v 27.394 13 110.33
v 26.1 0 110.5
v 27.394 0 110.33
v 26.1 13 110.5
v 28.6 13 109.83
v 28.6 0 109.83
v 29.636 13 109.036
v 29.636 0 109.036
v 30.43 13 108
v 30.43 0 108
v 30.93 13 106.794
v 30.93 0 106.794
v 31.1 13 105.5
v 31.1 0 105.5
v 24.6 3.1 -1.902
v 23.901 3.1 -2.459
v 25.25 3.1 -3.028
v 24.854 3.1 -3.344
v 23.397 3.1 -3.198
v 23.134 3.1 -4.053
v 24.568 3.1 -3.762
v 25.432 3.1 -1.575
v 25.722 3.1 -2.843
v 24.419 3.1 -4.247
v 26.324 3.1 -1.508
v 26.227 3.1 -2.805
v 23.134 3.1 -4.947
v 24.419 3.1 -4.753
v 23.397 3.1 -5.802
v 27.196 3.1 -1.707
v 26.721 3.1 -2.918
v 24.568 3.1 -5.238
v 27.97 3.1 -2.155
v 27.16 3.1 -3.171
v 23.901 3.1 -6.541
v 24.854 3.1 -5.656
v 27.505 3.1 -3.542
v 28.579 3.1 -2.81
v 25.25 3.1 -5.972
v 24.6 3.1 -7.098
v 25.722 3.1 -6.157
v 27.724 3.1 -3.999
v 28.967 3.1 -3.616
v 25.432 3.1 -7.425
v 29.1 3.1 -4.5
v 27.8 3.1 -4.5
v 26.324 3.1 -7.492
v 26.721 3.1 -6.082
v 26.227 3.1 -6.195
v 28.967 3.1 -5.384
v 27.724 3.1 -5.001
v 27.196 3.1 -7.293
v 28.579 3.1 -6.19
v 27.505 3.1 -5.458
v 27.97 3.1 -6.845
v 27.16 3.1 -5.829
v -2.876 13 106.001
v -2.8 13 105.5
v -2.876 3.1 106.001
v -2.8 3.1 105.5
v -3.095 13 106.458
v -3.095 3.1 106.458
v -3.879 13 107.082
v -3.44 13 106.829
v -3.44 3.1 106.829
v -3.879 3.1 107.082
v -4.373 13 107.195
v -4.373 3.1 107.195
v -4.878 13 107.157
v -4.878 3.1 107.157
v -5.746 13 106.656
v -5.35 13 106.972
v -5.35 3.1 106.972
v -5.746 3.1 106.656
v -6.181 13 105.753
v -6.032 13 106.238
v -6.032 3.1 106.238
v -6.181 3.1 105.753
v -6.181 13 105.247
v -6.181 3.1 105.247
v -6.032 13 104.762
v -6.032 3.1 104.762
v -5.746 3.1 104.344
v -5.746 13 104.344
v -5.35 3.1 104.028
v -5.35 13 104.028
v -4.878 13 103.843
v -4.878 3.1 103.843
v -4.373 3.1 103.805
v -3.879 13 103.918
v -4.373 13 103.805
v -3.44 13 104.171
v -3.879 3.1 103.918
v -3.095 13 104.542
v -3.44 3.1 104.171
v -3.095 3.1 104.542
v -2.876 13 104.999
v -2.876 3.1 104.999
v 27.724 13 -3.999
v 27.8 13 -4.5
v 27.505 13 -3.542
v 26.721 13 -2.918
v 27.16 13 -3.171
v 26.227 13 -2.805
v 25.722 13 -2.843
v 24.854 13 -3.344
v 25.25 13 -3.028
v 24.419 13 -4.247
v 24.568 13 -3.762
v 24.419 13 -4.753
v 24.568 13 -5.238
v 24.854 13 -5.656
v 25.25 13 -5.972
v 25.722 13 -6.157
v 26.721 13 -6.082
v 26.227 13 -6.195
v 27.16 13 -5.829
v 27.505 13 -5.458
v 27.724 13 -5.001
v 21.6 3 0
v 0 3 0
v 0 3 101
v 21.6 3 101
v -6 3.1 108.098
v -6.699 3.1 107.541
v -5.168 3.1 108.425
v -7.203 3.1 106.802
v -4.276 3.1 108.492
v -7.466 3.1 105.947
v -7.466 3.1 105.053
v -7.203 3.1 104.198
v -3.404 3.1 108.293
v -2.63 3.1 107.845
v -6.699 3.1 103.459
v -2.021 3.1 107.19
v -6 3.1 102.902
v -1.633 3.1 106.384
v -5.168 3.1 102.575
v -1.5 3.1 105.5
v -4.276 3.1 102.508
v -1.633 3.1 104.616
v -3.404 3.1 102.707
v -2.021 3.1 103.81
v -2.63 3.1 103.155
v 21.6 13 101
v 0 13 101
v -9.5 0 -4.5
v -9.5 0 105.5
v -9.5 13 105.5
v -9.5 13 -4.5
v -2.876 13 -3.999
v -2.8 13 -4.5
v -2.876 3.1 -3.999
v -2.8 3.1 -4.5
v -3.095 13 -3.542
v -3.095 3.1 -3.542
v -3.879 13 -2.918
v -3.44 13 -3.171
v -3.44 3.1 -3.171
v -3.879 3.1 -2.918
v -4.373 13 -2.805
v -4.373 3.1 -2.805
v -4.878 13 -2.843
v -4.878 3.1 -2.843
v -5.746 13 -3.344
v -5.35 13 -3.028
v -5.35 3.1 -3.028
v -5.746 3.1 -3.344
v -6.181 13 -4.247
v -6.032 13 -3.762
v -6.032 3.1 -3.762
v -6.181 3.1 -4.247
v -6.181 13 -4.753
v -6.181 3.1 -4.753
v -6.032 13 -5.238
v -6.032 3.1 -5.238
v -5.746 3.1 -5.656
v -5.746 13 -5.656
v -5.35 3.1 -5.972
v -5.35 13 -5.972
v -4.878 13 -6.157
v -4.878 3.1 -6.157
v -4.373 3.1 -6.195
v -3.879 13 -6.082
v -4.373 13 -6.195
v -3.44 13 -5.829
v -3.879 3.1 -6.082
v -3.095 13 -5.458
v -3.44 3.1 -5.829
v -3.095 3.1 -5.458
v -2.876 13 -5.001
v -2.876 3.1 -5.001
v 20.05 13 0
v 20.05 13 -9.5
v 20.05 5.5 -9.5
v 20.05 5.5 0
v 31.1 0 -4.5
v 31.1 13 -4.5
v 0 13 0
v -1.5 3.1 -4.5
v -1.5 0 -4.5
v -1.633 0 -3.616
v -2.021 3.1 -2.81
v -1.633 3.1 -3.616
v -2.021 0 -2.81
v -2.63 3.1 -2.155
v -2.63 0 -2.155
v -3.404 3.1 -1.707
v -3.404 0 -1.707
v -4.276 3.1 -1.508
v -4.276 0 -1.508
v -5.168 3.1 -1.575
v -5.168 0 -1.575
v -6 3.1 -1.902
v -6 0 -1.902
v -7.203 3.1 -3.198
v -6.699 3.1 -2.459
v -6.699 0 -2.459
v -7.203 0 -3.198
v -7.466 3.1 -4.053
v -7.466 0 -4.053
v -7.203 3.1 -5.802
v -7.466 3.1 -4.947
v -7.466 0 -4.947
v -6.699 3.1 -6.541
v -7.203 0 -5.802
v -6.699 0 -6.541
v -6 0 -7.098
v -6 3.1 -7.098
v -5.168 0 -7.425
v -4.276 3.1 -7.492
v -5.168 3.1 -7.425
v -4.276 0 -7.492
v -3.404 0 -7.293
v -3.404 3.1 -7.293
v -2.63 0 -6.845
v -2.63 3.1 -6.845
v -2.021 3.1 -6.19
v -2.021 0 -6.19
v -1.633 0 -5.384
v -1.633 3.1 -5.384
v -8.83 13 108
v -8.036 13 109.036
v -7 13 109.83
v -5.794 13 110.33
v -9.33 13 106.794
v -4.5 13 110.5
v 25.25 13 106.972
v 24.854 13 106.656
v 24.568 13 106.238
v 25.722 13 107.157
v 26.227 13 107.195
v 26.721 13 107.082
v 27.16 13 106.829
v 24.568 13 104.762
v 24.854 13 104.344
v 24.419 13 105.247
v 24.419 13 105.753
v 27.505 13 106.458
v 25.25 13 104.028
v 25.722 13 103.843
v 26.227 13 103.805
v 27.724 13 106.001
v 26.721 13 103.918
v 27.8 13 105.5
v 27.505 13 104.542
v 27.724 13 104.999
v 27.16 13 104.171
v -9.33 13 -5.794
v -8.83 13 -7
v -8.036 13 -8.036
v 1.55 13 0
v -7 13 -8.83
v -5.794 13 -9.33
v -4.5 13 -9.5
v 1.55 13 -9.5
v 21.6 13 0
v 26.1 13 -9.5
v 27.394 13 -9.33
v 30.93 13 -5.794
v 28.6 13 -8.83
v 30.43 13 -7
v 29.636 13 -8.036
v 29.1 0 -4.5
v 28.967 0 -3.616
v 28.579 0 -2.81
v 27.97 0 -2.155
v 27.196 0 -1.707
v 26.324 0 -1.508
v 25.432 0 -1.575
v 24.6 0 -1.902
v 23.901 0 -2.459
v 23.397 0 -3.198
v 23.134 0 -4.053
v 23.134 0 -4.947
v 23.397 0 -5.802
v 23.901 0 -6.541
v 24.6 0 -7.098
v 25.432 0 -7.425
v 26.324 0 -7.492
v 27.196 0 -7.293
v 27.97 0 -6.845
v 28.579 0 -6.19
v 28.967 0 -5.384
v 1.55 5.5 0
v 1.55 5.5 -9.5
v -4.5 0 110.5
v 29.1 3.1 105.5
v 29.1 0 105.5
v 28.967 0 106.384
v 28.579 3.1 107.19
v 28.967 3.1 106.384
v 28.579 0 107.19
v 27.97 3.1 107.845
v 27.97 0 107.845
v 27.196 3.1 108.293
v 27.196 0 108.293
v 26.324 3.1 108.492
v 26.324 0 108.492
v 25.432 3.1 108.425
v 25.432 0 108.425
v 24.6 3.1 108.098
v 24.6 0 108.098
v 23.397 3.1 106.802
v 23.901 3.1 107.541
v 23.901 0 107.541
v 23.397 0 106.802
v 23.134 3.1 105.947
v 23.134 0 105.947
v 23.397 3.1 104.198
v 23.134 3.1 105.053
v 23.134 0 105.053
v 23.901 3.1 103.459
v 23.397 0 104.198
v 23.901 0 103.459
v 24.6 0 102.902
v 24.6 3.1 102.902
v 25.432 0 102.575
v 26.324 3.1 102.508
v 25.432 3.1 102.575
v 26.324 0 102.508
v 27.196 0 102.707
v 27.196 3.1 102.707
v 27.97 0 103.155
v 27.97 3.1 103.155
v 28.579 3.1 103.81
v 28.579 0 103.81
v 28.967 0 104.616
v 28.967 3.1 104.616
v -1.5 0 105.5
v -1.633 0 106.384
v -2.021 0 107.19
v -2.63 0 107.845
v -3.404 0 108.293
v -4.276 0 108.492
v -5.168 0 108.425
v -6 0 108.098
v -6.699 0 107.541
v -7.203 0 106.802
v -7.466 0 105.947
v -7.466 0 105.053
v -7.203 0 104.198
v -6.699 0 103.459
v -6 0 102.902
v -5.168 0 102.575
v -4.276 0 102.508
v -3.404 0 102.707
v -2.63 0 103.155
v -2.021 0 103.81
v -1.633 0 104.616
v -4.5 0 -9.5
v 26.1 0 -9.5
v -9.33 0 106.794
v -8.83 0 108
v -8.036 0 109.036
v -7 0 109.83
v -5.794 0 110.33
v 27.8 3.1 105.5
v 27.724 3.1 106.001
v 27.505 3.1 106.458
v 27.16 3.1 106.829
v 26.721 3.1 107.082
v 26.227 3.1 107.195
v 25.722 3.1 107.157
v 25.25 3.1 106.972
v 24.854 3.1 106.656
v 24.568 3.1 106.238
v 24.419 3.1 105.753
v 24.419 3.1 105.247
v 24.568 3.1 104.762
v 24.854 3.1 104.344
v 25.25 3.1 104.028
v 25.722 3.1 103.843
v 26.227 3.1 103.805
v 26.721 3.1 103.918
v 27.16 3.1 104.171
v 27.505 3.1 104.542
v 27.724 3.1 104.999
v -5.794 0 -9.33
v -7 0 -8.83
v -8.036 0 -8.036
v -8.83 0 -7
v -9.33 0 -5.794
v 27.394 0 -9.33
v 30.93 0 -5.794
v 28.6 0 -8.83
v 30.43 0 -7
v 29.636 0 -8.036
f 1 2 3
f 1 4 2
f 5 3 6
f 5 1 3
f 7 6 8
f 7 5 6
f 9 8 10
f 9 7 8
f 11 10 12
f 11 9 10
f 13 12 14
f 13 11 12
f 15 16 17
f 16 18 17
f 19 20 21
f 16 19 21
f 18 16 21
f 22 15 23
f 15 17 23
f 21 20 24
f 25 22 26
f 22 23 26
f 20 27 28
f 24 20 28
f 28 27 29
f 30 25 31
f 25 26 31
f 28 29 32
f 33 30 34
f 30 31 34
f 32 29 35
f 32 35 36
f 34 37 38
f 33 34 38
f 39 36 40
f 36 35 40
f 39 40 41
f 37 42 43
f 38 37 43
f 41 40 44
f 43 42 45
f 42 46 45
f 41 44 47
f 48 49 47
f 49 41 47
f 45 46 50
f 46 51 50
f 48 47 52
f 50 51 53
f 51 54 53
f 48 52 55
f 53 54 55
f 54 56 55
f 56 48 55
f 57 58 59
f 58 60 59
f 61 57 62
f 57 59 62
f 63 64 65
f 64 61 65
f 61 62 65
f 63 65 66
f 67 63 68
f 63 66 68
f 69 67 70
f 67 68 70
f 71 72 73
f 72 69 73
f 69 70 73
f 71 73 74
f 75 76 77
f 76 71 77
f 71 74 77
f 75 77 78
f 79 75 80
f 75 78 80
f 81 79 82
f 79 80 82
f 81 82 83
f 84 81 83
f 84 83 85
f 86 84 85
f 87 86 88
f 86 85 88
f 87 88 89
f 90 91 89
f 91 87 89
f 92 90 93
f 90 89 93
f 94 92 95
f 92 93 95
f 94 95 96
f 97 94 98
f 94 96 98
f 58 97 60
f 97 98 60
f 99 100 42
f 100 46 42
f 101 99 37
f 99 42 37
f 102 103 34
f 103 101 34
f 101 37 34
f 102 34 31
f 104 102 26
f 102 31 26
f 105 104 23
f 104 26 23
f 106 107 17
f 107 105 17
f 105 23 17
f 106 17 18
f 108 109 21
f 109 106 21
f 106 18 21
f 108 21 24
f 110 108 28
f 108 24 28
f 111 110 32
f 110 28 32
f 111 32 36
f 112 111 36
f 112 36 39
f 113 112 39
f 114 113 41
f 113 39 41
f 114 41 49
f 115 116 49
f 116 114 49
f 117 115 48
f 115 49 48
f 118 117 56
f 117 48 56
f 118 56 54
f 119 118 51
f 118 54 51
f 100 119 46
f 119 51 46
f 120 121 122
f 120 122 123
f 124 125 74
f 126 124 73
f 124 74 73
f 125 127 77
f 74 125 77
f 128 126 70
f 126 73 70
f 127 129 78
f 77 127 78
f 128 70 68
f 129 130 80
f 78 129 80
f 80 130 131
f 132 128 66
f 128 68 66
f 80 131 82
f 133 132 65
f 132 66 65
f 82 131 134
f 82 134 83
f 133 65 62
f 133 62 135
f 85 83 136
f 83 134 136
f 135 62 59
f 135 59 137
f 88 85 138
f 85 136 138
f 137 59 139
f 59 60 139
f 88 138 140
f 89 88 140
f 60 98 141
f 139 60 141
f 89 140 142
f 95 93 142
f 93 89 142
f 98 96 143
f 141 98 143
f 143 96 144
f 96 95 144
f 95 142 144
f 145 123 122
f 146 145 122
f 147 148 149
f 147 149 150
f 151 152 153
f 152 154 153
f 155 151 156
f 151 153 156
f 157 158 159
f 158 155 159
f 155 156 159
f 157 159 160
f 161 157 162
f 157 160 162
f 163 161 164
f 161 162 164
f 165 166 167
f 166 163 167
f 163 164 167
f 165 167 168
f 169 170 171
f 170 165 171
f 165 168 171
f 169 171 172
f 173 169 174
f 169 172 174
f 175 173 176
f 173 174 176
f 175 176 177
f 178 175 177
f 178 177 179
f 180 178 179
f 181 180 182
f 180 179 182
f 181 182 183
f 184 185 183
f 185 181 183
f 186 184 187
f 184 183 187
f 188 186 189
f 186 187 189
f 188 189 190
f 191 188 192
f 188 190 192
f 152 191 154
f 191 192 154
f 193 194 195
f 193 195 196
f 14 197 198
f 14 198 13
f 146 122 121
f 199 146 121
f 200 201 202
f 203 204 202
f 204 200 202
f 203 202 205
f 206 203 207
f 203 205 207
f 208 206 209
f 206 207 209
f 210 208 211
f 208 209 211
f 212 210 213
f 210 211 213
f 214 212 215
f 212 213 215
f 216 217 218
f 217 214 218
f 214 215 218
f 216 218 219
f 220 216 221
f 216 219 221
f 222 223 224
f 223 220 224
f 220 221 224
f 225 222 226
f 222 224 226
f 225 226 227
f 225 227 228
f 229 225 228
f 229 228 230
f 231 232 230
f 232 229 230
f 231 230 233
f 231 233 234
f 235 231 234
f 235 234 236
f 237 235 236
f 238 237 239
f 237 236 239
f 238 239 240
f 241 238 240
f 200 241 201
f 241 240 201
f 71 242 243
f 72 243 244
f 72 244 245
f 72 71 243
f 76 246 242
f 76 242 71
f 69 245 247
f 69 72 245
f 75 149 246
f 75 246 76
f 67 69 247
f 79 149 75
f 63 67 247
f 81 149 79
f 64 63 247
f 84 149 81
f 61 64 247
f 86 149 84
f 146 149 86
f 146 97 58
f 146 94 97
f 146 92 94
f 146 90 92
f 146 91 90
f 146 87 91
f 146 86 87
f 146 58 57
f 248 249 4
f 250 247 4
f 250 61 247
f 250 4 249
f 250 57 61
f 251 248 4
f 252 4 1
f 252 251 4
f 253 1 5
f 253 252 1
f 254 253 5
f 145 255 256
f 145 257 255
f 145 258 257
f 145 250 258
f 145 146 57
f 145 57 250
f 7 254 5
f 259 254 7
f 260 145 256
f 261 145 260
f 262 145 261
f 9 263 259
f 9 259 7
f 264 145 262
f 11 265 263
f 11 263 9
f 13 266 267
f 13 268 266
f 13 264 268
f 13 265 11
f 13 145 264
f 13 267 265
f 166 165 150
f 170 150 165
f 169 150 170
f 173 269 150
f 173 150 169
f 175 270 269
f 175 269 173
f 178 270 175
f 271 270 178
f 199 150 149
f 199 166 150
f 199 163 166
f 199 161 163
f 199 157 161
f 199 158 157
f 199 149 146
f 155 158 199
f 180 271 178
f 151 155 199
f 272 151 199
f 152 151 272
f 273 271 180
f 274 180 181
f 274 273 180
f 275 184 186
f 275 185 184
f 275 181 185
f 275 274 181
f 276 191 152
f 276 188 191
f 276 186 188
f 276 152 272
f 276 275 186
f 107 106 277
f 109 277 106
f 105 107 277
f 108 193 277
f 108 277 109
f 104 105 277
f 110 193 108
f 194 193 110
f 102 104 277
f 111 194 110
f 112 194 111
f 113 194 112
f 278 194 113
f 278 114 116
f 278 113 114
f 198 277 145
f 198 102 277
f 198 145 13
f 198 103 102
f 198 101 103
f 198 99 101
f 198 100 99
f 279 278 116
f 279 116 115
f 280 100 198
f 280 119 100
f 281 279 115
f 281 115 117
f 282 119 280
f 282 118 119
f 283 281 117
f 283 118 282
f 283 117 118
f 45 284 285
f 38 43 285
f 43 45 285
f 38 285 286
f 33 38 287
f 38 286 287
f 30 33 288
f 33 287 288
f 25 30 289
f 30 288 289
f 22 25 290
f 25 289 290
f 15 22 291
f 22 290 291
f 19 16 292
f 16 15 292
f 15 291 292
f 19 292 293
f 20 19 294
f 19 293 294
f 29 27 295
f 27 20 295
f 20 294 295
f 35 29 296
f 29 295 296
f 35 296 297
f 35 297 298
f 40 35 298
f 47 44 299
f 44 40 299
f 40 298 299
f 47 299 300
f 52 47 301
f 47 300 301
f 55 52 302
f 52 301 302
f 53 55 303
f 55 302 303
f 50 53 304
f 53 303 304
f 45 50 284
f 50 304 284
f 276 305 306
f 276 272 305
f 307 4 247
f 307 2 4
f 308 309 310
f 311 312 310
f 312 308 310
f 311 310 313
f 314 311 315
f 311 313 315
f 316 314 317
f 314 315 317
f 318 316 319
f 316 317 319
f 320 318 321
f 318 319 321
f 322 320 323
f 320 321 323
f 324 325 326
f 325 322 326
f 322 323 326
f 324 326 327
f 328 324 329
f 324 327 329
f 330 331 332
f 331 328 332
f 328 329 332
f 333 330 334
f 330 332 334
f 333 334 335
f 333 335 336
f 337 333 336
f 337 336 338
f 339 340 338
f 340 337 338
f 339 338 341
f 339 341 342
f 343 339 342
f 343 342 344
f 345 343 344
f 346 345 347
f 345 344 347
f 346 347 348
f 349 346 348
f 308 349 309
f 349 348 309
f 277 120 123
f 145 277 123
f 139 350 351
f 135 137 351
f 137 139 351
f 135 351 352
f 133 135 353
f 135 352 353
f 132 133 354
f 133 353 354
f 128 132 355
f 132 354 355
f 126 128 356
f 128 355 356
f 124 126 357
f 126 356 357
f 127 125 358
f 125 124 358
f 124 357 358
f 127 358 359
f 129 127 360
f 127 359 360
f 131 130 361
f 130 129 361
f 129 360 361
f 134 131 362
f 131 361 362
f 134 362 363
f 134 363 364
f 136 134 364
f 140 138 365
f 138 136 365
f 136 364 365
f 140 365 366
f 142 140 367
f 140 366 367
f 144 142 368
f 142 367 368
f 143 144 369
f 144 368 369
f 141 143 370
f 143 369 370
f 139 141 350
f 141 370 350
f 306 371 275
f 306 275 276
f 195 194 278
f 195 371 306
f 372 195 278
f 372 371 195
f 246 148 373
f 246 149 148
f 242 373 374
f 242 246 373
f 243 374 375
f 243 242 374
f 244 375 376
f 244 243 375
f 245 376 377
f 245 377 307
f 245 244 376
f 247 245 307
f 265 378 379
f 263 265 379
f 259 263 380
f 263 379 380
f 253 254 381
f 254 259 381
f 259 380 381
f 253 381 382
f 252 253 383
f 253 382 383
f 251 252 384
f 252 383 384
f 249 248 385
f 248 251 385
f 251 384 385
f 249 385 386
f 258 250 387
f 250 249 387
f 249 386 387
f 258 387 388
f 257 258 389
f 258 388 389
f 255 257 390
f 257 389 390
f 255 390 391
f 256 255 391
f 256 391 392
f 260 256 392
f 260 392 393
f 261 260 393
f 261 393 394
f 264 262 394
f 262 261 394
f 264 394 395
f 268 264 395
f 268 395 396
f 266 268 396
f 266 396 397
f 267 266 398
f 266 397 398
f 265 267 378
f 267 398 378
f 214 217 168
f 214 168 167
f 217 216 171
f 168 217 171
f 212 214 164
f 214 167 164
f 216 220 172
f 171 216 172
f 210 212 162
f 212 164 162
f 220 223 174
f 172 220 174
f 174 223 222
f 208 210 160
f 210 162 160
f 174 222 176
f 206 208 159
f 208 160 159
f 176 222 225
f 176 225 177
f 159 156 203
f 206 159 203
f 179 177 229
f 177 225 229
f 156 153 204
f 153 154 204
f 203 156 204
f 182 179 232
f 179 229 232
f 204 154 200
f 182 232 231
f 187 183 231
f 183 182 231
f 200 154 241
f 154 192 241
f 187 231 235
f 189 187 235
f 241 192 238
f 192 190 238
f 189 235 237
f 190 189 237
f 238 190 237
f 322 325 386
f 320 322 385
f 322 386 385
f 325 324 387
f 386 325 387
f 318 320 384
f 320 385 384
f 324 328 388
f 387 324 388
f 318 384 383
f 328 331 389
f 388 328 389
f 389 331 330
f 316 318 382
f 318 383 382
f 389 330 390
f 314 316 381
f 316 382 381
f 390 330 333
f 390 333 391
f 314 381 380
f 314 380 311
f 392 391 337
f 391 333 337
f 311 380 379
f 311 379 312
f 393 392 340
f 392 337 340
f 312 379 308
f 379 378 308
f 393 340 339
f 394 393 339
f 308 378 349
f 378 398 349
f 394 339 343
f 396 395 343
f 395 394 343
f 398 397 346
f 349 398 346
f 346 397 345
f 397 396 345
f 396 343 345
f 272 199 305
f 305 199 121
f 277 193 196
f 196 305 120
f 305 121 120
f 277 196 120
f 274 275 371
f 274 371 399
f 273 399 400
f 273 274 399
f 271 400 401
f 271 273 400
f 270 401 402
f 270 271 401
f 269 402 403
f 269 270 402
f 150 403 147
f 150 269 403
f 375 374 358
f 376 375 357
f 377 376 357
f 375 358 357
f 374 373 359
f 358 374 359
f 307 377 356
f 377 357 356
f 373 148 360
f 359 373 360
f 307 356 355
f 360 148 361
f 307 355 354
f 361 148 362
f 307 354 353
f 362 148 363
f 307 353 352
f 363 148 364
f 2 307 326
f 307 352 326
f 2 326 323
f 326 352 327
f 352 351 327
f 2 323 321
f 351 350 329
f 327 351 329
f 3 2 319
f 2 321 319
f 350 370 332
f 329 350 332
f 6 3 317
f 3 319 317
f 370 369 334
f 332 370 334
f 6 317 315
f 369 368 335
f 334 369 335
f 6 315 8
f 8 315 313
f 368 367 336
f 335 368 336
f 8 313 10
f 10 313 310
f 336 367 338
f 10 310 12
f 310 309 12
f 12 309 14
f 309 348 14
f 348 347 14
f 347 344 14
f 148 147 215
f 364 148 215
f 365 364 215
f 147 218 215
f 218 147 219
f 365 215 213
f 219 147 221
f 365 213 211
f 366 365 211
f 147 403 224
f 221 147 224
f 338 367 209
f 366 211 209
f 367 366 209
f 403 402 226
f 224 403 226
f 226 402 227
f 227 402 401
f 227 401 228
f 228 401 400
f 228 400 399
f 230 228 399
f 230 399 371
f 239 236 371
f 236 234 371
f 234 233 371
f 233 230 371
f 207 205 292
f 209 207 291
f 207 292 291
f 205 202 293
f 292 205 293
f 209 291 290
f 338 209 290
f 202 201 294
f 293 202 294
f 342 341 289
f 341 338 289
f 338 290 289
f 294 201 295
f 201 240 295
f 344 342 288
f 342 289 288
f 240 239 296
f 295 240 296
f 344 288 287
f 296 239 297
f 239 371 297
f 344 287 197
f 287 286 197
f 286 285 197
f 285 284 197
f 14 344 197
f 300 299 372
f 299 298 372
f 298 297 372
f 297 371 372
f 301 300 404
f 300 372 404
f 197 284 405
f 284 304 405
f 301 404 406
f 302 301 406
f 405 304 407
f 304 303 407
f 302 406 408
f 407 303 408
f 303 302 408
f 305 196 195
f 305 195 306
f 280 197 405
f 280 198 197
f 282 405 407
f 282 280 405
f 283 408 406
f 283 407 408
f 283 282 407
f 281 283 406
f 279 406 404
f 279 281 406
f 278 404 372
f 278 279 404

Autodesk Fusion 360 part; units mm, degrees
sketch "Sketch1" plane through (0, 0, 0) normal (0, 1, 0) x (1, 0, 0)
  line L0 (0, 0) -> (21.6, 0)
  line L1 (21.6, 0) -> (21.6, -101)
  line L2 (21.6, -101) -> (0, -101)
  line L3 (0, -101) -> (0, 0)
  line L4 (-9.5, 9.5) -> (31.1, 9.5)
  line L5 (31.1, 9.5) -> (31.1, -110.5)
  line L6 (31.1, -110.5) -> (-9.5, -110.5)
  line L7 (-9.5, -110.5) -> (-9.5, 9.5)
  circle A0 centre (-4.5, -105.5) radius 1.7
  circle A1 centre (26.1, -105.5) radius 1.7
  circle A2 centre (26.1, 4.5) radius 1.7
  circle A3 centre (-4.5, 4.5) radius 1.7
  circle A4 centre (-4.5, 4.5) radius 3
  circle A5 centre (26.1, 4.5) radius 3
  circle A6 centre (26.1, -105.5) radius 3
  circle A7 centre (-4.5, -105.5) radius 3
  dimension "d1" = 21.6
  dimension "d2" = 101
  dimension "d3" = 40.6
  dimension "d4" = 120
  dimension "d5" = 9.5
  dimension "d6" = 9.5
  dimension "d7" = 3.4
  dimension "d8" = 3.4
  dimension "d9" = 3.4
  dimension "d10" = 3.4
  dimension "d11" = 5
  dimension "d12" = 5
  dimension "d13" = 5
  dimension "d14" = 5
  dimension "d15" = 5
  dimension "d16" = 5
  dimension "d17" = 5
  dimension "d18" = 5
  dimension "d19" = 6
  dimension "d20" = 6
  dimension "d21" = 6
  dimension "d22" = 6
extrude "Extrude1" add sketch "Sketch1" along normal blind 9.9 from surface at 3.1 contours A4 | A5 | A6 | A7 makes body 1 at (29.0963, 9.7, -4.3505) makes body 2 at (-1.5037, 9.7, -4.3505) makes body 3 at (28.6599, 9.7, 103.9357) makes body 4 at (-7.2644, 9.7, 106.6653)
extrude "Extrude2" add sketch "Sketch1" along normal blind 13 contours L4 L5 L6 L7 bodies 1 2 3 4
extrude "Extrude3" add sketch "Sketch1" along normal blind 3 contours L0 L1 L2 L3 bodies 1
sketch "Sketch2" plane through (0, 13, 0) normal (0, 1, 0) x (-1, 0, 0)
  circle A0 centre (-26.1, -4.5) radius 1.7
  circle A1 centre (4.5, 105.5) radius 1.7
  line L0 (-21.6, 101) -> (0, 101)
  line L1 (0, 101) -> (0, 0)
  line L2 (0, 0) -> (-21.6, 0)
  line L3 (-21.6, 0) -> (-21.6, 101)
  line L4 (9.5, 110.5) -> (-31.1, 110.5)
  line L5 (-31.1, 110.5) -> (-31.1, -9.5)
  line L6 (-31.1, -9.5) -> (9.5, -9.5)
  line L7 (9.5, -9.5) -> (9.5, 110.5)
  circle A2 centre (4.5, -4.5) radius 1.7
  circle A3 centre (-26.1, 105.5) radius 1.7
  line L8 (-1.55, -9.5) -> (-20.05, -9.5)
  line L9 (-20.05, -9.5) -> (-20.05, 0)
  line L10 (-20.05, 0) -> (-1.55, 0)
  line L11 (-1.55, 0) -> (-1.55, -9.5)
  dimension "d30" = 11.05
  dimension "d31" = 18.5
extrude "Extrude4" cut sketch "Sketch2" against normal blind 7.5 contours L2 L6 L8 L9 L10 L11 bodies 1
fillet "Fillet1" radius 5 4 edges at (31.1, 6.5, -9.5) (-9.5, 6.5, -9.5) (-9.5, 6.5, 110.5) (31.1, 6.5, 110.5) on bodies 1
